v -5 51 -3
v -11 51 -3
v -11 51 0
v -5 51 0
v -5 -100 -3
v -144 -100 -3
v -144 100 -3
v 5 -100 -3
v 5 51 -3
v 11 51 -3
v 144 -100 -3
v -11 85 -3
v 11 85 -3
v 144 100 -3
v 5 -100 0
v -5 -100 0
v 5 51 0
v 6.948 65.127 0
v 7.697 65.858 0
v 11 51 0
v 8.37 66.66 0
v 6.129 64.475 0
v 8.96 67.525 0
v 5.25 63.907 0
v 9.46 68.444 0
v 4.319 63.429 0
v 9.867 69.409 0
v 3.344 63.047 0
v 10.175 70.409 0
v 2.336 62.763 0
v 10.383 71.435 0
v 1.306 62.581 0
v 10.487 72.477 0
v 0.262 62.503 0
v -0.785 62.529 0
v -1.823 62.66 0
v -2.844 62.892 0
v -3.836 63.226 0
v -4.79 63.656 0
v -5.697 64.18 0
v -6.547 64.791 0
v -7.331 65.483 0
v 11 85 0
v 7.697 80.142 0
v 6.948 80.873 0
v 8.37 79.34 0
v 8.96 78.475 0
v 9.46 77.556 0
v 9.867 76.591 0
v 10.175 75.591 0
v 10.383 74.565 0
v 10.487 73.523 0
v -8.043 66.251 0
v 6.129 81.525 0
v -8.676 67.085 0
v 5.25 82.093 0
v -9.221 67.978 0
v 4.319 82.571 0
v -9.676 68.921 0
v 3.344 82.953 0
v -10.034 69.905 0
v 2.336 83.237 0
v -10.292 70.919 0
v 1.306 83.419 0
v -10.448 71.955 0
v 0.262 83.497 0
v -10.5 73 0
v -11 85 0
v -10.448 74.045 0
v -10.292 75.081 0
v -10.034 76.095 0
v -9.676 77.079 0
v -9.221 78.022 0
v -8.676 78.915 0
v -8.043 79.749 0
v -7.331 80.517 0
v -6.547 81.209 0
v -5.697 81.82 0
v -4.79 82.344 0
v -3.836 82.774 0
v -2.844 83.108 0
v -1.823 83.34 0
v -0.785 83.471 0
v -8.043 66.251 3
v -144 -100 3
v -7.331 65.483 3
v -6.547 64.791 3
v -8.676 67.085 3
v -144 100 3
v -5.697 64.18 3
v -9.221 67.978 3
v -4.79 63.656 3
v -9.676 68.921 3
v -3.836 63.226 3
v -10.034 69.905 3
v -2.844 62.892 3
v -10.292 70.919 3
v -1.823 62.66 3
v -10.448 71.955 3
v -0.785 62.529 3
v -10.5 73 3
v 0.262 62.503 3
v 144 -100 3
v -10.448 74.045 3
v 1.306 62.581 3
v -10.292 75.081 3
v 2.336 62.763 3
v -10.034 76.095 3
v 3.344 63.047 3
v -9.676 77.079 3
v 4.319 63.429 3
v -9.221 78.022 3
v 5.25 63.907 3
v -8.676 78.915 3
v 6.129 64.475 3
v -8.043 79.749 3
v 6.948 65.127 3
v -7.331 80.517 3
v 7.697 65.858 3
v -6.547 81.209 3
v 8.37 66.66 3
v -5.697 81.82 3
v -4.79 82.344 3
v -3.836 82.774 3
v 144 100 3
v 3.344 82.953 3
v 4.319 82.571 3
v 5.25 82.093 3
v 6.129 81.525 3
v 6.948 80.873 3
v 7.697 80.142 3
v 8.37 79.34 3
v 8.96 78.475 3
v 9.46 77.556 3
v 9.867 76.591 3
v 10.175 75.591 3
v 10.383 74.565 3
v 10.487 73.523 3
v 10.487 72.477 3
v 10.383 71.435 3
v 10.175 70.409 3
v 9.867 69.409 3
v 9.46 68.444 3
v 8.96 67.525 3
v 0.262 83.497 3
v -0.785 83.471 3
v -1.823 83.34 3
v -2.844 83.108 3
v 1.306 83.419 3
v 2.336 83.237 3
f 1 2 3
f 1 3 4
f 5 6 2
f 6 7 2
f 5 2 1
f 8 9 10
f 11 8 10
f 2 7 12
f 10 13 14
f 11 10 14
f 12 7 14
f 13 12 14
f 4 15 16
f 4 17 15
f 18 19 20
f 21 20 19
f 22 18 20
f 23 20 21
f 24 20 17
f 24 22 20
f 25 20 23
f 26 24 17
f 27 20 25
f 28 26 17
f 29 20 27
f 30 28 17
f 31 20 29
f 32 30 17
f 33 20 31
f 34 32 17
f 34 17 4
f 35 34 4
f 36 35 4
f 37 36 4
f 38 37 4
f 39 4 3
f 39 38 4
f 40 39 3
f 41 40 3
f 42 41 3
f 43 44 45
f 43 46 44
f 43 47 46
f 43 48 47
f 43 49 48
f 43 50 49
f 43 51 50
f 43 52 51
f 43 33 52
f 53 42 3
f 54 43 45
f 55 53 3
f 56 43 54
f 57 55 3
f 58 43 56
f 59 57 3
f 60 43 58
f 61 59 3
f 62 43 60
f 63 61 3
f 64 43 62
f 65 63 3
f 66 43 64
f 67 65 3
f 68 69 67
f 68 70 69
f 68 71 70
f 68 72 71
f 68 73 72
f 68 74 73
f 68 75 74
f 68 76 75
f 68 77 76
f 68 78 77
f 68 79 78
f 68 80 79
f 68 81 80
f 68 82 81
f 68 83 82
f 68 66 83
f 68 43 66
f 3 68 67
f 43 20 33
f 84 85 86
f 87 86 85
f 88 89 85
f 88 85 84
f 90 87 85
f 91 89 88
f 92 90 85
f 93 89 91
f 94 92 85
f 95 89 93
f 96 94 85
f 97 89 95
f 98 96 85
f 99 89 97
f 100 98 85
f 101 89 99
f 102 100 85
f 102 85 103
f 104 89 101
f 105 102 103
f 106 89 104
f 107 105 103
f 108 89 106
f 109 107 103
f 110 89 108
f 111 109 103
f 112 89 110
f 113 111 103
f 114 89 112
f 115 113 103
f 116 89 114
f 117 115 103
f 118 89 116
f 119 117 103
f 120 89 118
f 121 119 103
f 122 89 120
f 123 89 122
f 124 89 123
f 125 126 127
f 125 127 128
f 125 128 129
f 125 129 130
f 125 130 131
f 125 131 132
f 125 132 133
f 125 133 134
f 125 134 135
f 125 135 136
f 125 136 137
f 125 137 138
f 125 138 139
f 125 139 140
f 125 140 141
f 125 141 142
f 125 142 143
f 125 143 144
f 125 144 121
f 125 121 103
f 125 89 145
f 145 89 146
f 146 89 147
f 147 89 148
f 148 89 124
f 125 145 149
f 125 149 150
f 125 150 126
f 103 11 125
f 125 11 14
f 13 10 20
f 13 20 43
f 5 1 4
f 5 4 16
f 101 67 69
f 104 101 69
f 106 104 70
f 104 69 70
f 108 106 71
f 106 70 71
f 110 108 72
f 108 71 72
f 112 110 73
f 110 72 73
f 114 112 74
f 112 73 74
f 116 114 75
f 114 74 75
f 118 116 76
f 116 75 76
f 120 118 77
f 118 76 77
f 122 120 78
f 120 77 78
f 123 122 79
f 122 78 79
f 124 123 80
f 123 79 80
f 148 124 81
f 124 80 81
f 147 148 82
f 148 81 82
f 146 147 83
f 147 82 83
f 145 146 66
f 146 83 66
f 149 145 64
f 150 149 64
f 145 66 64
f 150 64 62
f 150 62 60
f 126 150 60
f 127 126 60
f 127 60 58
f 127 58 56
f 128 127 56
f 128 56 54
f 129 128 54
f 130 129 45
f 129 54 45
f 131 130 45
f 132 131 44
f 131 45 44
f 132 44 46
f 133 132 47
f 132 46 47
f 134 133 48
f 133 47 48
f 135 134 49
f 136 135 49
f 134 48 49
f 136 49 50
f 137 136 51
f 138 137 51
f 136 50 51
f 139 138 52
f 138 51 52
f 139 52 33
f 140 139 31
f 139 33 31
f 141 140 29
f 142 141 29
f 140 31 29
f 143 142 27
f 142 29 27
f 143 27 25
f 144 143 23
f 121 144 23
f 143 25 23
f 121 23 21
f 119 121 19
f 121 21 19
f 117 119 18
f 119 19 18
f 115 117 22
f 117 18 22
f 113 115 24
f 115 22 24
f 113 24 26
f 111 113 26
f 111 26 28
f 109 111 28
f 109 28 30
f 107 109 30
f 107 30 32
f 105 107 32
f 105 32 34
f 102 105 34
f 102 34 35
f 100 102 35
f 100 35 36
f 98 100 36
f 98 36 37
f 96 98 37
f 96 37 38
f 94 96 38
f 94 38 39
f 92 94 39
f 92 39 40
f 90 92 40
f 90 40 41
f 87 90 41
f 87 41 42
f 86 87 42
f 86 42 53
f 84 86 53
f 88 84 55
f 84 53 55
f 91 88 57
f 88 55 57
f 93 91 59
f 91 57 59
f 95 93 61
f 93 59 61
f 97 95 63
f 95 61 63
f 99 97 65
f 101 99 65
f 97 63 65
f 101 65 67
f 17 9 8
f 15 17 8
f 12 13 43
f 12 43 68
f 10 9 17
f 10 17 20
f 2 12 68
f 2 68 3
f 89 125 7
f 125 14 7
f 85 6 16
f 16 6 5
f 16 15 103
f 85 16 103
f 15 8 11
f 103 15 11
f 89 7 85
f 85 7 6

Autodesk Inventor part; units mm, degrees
ref_plane "YZ Plane" through (0, 0, 0) normal (1, 0, 0) x (0, 1, 0)
ref_plane "XZ Plane" through (0, 0, 0) normal (0, 1, 0) x (-1, 0, 0)
ref_plane "XY Plane" through (0, 0, 0) normal (0, 0, 1) x (1, 0, 0)
sketch "Szkic1" plane through (0, 0, 0) normal (0, 0, 1) x (1, 0, 0)
  line L0 (144, 100) -> (-144, 100)
  line L1 (-144, 100) -> (-144, -100)
  line L2 (-144, -100) -> (144, -100)
  line L3 (144, -100) -> (144, 100)
  line L4 (144, 100) -> (-144, -100) construction
  line L5 (-144, 100) -> (144, -100) construction
  point P0 (0, 0)
  dimension "d0" = 288
  dimension "d1" = 200
extrude "Wyciągnięcie proste1" add sketch "Szkic1" along normal mid plane 6
sketch "Szkic2" plane through (0, 0, -3) normal (0, 0, -1) x (-1, 0, 0)
  line L0 (11, 51) -> (-11, 51)
  line L1 (-11, 51) -> (-11, 85)
  line L2 (-11, 85) -> (11, 85)
  line L3 (11, 85) -> (11, 51)
  line L4 (11, 51) -> (-11, 85) construction
  line L5 (-11, 51) -> (11, 85) construction
  line L6 (144, 100) -> (-144, 100) projected
  line L7 (-144, 100) -> (-144, -100) projected
  circle A0 centre (0, 73) radius 10.5
  line L8 (-144, -100) -> (144, -100) projected
  line L9 (144, -100) -> (144, 100) projected
  line L10 (-5, 51) -> (-5, -100)
  line L11 (5, 51) -> (5, -100)
  point P0 (0, 0)
  point P1 (0, 68)
  dimension "d4" = 34
  dimension "d5" = 22
  dimension "d6" = 15
  dimension "d8" = 21
  dimension "d9" = 12
  dimension "d10" = 11
  dimension "d15" = 10
  dimension "d16" = 139
  dimension "d19" = 144
extrude "Wyciągnięcie proste2" cut sketch "Szkic2" against normal through all contours A0
extrude "Wyciągnięcie proste3" cut sketch "Szkic2" against normal blind 3 contours L0 L1 L2 L3
extrude "Wyciągnięcie proste5" cut sketch "Szkic2" against normal blind 3 contours L11 L8 L10 L0
properties part number "RightWall"
